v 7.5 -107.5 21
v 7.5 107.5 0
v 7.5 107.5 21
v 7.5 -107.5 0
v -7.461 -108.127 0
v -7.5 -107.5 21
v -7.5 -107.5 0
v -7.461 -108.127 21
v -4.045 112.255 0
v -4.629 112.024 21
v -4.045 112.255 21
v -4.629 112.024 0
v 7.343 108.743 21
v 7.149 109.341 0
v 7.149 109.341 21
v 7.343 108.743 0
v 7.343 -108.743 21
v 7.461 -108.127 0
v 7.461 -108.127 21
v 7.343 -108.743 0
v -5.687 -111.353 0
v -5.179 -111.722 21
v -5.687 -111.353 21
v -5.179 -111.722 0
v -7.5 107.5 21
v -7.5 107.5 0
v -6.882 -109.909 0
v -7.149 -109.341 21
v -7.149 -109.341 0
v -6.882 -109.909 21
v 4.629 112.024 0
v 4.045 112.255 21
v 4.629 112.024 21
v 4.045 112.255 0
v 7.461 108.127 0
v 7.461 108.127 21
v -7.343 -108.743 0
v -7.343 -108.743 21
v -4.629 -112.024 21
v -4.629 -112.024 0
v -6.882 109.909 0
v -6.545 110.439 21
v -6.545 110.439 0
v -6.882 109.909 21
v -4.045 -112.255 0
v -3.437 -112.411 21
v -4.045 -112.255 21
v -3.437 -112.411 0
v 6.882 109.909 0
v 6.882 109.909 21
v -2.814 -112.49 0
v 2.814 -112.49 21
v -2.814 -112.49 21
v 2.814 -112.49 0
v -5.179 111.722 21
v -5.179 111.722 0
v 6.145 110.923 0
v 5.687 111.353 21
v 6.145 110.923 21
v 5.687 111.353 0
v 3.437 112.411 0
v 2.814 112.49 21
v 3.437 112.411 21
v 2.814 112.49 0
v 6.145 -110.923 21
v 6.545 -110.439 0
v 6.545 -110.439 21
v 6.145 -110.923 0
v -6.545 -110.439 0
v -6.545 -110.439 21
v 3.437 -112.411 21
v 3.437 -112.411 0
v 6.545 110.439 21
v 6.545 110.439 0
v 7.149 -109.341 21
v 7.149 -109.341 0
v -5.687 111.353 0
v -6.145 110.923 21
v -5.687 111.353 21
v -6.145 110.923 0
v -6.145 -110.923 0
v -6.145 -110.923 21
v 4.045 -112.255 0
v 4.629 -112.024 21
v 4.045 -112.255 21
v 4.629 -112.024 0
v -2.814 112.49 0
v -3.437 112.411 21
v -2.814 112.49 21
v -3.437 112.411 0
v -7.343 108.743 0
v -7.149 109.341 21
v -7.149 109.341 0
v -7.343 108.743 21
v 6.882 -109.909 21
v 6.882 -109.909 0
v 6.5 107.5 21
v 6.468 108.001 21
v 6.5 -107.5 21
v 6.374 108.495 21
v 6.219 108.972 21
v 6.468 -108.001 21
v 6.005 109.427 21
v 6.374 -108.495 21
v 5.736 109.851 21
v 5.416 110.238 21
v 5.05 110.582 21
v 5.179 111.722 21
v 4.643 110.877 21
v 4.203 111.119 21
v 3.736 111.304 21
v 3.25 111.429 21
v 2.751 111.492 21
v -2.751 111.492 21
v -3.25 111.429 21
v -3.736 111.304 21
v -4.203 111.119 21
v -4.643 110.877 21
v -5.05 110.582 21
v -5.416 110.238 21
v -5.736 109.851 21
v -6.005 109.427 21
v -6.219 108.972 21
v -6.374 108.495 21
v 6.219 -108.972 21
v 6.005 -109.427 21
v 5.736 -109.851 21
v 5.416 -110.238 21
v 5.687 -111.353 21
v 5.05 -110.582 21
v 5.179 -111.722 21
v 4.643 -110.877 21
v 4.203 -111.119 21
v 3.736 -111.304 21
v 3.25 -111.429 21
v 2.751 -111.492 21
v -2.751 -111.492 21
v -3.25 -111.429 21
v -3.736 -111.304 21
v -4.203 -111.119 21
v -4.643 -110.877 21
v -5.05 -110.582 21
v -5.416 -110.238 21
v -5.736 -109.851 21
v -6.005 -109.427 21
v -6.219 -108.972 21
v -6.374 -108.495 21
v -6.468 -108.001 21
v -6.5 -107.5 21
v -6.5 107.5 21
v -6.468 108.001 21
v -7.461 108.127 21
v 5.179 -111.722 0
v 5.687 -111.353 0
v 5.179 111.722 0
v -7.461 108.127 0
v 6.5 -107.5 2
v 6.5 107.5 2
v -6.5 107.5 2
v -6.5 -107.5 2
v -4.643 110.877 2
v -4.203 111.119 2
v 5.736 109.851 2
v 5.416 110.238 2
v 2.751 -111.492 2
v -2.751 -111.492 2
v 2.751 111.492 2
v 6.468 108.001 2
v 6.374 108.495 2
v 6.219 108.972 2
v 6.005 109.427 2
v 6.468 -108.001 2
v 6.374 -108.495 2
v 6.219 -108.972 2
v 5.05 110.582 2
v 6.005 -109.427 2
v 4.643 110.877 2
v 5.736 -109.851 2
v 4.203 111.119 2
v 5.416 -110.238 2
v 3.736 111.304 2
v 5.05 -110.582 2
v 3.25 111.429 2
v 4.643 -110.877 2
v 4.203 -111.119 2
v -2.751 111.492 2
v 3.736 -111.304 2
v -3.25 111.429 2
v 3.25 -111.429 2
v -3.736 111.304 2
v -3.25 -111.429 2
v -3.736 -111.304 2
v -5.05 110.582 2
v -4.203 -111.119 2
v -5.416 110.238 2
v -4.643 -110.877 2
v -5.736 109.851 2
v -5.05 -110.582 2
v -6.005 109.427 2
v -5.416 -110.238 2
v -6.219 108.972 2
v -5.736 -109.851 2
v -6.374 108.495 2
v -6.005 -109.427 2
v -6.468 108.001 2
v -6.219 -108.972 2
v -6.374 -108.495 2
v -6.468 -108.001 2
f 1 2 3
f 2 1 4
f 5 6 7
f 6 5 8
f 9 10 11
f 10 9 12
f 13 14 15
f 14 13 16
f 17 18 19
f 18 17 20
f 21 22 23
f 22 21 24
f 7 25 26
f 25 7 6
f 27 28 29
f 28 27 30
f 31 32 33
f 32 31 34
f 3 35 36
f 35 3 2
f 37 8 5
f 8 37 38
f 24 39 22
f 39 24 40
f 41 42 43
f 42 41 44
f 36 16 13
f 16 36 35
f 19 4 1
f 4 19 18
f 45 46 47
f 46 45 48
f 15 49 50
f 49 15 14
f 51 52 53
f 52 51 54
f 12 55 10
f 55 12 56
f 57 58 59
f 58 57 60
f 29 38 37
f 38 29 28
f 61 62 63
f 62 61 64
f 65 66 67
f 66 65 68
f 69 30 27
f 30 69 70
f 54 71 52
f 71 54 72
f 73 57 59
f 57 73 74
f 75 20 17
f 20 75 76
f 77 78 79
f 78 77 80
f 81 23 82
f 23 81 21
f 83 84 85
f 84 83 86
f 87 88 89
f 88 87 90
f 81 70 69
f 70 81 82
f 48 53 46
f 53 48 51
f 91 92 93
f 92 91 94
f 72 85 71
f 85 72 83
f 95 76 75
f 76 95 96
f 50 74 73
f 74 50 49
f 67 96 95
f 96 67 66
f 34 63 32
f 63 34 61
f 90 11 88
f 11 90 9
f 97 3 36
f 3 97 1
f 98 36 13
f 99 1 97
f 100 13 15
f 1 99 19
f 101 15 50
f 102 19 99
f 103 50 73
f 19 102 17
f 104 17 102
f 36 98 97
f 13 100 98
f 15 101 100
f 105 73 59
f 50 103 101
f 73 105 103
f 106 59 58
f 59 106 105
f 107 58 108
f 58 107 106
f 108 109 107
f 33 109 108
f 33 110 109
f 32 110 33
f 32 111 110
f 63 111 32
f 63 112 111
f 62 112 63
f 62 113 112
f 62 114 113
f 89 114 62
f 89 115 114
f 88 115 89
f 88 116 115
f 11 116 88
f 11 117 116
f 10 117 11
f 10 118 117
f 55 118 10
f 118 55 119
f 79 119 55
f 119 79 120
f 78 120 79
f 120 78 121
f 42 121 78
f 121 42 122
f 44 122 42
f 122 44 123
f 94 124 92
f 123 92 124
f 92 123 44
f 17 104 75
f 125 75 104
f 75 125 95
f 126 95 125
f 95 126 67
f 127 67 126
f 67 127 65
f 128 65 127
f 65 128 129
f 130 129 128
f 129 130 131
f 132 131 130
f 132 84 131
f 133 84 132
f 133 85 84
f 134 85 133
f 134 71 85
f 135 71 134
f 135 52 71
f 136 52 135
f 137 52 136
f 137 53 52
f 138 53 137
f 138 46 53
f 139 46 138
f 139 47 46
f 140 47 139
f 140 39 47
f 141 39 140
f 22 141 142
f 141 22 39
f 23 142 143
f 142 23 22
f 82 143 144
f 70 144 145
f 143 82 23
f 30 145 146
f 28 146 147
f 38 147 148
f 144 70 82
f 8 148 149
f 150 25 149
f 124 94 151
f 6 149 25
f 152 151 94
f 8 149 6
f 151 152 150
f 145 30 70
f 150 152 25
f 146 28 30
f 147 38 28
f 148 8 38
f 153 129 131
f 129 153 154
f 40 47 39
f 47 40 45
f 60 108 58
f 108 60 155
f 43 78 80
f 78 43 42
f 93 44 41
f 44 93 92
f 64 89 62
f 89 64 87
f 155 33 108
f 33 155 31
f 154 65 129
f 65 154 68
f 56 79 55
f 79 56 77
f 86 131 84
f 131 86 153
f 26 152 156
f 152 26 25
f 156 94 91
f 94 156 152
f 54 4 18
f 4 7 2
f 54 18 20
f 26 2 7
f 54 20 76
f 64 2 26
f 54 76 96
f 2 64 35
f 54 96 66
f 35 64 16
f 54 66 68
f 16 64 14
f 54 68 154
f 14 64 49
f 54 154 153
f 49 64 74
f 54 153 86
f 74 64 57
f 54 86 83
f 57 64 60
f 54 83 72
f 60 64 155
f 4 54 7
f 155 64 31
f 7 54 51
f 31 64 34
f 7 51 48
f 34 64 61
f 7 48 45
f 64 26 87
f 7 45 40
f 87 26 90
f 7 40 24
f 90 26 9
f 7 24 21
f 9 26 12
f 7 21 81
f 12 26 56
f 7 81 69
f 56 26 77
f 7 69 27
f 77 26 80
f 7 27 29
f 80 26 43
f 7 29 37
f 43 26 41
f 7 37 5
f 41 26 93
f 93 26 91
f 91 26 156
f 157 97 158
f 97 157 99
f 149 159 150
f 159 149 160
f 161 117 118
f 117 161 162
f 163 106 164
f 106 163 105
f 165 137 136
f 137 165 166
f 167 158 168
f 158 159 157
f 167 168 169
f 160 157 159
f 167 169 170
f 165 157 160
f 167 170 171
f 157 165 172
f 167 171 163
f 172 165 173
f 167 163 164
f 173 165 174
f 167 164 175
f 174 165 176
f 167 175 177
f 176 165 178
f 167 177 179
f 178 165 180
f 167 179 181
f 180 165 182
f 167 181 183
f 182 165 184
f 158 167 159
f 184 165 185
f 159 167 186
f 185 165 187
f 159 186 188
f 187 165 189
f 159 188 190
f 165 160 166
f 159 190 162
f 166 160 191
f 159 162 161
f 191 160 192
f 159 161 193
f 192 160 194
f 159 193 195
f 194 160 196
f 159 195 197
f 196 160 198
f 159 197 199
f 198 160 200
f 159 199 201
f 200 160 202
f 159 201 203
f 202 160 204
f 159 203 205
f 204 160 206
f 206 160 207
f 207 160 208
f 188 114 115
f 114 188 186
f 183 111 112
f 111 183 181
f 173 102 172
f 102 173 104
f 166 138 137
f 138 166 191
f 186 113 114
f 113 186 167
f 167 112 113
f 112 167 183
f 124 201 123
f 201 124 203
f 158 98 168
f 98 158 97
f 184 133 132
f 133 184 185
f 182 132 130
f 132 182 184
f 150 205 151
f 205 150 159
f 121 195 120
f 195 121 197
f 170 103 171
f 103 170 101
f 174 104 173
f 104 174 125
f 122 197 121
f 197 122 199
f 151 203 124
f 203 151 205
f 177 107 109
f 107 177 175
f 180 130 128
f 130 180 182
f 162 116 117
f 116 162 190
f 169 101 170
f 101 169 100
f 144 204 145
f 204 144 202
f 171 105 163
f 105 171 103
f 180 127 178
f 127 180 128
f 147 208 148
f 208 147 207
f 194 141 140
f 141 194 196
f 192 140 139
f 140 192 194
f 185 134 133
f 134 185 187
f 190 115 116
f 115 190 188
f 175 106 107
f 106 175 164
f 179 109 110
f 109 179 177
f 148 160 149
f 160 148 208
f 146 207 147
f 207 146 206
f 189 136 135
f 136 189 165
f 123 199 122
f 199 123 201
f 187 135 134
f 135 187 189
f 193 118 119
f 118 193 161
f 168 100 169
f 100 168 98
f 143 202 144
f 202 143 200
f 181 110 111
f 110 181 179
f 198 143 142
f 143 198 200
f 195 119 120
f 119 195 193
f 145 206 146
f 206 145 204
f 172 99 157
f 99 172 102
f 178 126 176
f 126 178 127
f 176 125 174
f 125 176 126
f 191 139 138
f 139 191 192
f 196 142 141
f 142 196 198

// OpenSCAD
$fn = 50;


difference() {
	union() {
		hull() {
			translate(v = [-2.5000000000, 107.5000000000, 0]) {
				cylinder(h = 21, r = 5);
			}
			translate(v = [2.5000000000, 107.5000000000, 0]) {
				cylinder(h = 21, r = 5);
			}
			translate(v = [-2.5000000000, -107.5000000000, 0]) {
				cylinder(h = 21, r = 5);
			}
			translate(v = [2.5000000000, -107.5000000000, 0]) {
				cylinder(h = 21, r = 5);
			}
		}
	}
	union() {
		translate(v = [0, 0, 2]) {
			hull() {
				translate(v = [-2.5000000000, 107.5000000000, 0]) {
					cylinder(h = 19, r = 4);
				}
				translate(v = [2.5000000000, 107.5000000000, 0]) {
					cylinder(h = 19, r = 4);
				}
				translate(v = [-2.5000000000, -107.5000000000, 0]) {
					cylinder(h = 19, r = 4);
				}
				translate(v = [2.5000000000, -107.5000000000, 0]) {
					cylinder(h = 19, r = 4);
				}
			}
		}
	}
}
